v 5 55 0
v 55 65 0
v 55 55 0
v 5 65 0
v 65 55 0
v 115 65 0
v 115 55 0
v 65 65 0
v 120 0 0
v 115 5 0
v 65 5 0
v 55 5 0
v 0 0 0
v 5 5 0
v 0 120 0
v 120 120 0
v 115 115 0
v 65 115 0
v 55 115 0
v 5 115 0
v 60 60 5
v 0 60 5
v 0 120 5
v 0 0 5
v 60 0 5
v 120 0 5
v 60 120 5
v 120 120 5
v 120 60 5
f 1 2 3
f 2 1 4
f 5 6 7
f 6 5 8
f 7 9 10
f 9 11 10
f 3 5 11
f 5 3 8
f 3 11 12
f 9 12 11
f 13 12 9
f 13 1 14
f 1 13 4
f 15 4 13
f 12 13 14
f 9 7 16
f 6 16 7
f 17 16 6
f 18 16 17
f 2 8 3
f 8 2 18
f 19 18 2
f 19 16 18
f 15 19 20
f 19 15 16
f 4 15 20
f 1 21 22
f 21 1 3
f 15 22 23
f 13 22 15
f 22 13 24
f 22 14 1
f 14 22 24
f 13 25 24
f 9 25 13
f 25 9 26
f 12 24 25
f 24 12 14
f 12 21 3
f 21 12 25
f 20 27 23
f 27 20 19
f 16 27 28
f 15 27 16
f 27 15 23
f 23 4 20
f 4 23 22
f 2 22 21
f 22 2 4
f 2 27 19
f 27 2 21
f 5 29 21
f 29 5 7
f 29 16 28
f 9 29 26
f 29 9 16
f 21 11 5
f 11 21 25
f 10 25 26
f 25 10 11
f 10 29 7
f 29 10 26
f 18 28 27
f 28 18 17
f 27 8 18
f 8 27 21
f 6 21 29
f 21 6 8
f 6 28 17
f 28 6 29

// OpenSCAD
// file: ../wiki-yoinks/prism.scad
module prism(l, w, h) {
    // from wiki
    // https://en.wikibooks.org/wiki/OpenSCAD_User_Manual/Primitive_Solids#polyhedron
    polyhedron(points =
                   [
                       [ 0, 0, 0 ], [ l, 0, 0 ], [ l, w, 0 ], [ 0, w, 0 ],
                       [ 0, w, h ], [ l, w, h ]
                   ],
               faces = [
                   [ 0, 1, 2, 3 ], [ 5, 4, 3, 2 ], [ 0, 4, 5, 1 ], [ 0, 3, 4 ],
                   [ 5, 2, 1 ]
               ]);
}
// file: grid.scad
include <config.scad>
use <../wiki-yoinks/prism.scad>

module GridSquare(grid_size, grid_height) {
    color([ 99 / 255, 30 / 255, 30 / 255 ]) {
        translate([ 0, grid_size - grid_height, 0 ]) {
            prism(grid_size, grid_height, grid_height);
        }
        translate([ grid_height, 0, 0 ]) {
            rotate([ 0, 0, 90 ]) { prism(grid_size, grid_height, grid_height); }
        }
        translate([ grid_size, grid_height, 0 ]) {
            rotate([ 0, 0, 180 ]) { prism(grid_size, grid_height, grid_height); }
        }
        translate([
            grid_size - grid_height,
            grid_size,
        ]) {
            rotate([ 0, 0, 270 ]) { prism(grid_size, grid_height, grid_height); }
        }
    }
}

GridSquare(grid_size, grid_height);
// file: config.scad
$fn = 60;

grid_size = 60;
grid_height = 5;

grid_x=2;
grid_y=2;


box_height = 68;
// main file
include <config.scad>
use <grid.scad>

for (i = [0:grid_x-1]) {
    for (j = [0:grid_y-1]) {
        translate([i*grid_size,j*grid_size,0]){
            GridSquare(grid_size, grid_height);
        }
    }
}
